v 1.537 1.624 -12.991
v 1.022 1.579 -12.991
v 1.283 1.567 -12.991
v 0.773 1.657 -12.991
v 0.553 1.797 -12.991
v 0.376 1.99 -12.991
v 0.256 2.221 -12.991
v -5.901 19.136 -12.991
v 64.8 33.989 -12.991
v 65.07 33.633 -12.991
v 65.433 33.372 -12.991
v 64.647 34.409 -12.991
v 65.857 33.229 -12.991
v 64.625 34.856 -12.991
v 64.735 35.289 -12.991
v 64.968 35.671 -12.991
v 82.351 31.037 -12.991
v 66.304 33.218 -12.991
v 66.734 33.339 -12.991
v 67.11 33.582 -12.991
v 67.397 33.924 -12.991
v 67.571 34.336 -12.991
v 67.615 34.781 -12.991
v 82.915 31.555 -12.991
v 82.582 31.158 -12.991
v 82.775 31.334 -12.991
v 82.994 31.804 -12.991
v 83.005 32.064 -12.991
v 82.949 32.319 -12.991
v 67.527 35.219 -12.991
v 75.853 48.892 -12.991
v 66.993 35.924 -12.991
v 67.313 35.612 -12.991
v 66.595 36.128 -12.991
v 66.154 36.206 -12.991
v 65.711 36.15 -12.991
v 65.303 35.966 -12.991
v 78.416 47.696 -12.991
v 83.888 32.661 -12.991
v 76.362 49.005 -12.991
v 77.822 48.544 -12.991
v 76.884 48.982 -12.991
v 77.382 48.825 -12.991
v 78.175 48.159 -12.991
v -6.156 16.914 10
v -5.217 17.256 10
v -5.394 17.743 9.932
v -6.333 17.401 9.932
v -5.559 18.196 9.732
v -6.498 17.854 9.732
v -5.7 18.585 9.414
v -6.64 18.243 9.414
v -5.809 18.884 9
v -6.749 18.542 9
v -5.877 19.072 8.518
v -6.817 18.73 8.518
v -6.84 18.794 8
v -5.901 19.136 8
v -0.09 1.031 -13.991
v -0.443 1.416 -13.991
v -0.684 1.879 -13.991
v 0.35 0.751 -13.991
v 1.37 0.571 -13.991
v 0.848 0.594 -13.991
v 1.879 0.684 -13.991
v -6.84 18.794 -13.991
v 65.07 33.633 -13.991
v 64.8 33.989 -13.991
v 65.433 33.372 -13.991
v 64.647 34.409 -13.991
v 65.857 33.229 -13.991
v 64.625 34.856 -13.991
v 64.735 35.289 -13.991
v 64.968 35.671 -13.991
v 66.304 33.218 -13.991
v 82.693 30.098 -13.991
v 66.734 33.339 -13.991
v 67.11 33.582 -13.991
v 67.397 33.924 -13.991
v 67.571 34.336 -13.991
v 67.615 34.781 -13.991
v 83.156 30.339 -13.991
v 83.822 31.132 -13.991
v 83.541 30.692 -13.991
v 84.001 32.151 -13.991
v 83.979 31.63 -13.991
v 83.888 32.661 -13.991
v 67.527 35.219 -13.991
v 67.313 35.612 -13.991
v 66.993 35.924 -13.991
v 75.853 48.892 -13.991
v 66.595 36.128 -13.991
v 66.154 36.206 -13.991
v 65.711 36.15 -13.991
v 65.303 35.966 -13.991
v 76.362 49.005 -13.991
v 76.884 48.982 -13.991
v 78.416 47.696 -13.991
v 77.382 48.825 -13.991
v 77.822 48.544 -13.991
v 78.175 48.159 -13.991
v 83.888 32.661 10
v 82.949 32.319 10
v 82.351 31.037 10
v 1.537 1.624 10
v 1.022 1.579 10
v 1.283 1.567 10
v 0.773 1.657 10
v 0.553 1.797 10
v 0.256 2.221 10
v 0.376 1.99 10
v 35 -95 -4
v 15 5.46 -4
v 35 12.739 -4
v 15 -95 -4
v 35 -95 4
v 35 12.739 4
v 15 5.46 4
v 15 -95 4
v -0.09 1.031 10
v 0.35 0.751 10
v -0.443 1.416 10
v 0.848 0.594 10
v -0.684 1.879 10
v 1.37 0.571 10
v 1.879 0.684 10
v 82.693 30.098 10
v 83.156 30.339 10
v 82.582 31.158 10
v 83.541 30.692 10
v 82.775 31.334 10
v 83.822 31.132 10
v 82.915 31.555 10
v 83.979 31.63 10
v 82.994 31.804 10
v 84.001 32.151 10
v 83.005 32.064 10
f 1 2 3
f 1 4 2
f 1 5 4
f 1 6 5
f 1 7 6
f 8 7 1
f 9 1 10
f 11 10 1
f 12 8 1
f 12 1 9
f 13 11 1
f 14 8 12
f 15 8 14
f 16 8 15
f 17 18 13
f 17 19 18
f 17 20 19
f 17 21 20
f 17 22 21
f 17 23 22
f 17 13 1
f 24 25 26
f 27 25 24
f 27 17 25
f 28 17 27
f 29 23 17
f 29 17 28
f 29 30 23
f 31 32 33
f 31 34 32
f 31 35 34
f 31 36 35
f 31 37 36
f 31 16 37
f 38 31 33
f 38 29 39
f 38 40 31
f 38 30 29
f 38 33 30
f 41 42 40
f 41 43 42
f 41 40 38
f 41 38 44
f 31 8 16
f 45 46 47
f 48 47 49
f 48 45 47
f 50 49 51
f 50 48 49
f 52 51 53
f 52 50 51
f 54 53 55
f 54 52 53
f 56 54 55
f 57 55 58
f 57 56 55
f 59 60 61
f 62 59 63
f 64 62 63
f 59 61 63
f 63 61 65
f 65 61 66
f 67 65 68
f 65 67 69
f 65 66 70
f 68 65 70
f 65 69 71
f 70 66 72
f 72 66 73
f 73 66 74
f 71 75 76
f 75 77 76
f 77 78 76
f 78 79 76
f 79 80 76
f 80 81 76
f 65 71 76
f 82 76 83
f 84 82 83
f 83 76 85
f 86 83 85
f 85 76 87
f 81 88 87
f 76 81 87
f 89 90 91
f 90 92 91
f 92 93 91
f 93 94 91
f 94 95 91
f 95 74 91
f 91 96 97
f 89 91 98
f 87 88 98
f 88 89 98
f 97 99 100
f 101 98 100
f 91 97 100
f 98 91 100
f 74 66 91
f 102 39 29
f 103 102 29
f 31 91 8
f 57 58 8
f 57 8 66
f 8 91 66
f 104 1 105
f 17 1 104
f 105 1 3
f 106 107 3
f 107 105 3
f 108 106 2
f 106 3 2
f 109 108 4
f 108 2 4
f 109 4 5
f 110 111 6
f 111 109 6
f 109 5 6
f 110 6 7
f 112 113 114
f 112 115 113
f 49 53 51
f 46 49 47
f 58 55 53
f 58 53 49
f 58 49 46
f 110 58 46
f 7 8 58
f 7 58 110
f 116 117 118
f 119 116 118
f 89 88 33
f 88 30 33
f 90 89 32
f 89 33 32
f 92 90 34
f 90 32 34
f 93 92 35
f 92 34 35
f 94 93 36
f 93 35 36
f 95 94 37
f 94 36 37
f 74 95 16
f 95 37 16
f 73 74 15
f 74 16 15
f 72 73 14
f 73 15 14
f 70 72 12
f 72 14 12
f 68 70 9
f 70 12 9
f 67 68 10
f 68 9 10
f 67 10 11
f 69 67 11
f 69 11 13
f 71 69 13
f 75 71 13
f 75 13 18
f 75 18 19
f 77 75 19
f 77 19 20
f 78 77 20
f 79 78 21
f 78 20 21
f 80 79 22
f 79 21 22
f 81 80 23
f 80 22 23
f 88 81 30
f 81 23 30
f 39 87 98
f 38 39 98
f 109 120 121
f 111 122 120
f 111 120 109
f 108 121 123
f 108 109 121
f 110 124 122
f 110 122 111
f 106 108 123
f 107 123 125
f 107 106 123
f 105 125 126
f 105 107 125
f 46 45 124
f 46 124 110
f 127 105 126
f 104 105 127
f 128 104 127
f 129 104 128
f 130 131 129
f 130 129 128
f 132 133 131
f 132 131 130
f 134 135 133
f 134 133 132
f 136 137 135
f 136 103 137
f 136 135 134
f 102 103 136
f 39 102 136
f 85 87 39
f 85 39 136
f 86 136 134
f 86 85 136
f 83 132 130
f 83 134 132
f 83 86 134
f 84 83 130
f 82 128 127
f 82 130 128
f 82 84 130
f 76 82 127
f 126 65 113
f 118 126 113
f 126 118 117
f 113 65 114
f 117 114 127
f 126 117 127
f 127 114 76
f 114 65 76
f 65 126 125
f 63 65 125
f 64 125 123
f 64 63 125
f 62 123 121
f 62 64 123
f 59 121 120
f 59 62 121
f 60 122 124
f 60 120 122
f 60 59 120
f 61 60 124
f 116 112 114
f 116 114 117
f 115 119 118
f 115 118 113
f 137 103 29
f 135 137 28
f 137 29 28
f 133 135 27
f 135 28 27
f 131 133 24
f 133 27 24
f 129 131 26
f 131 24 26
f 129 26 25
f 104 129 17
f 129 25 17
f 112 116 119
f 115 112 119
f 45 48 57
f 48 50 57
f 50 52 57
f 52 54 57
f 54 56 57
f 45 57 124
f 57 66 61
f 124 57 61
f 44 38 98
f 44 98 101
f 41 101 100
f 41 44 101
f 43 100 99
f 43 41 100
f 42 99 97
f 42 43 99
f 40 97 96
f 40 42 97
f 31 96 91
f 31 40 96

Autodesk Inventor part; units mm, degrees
ref_plane "YZ Plane" through (0, 0, 0) normal (1, 0, 0) x (0, 1, 0)
ref_plane "XY Plane" through (0, 0, 0) normal (0, 0, 1) x (1, 0, 0)
sketch "Sketch1" plane through (0, 0, 0) normal (0, 0, 1) x (1, 0, 0)
  line L0 (1.879385, 0.68404) -> (82.692951, 30.097773)
  line L1 (0, 0) -> (86, 0) construction
  line L2 (83.888296, 32.661198) -> (77.731933, 49.575665)
  line L3 (77.731933, 49.575665) -> (-6.840403, 18.793852)
  line L4 (-6.840403, 18.793852) -> (-0.68404, 1.879385)
  arc A0 (-0.68404, 1.879385) -> (1.879385, 0.68404) centre (1.195345, 2.563426) ccw
  arc A1 (82.692951, 30.097773) -> (83.888296, 32.661198) centre (82.00891, 31.977158) ccw
  point P0 (84.572336, 30.781813)
  dimension "d0" = 90
  dimension "d1" = 20
  dimension "d2" = 20
  dimension "d9" = 2
extrude "Extrusion1" add sketch "Sketch1" along normal blind 10 and the other way blind 13.991
shell "Shell1" thickness 1 removed faces 3 at (49.541154, 39.315061, -5.994) at (81.836175, 38.299354, 2.003) at (24.256972, 23.017853, 10)
fillet "Fillet1" radius 2 2 edges at (-6.3706, 18.9649, 10) (77.7319, 49.5757, -13.491)
sketch "Sketch2" plane through (1.537365, 1.623733, -12.991) normal (0, 0, 1) x (0.9396926, 0.3420201, 0)
  point P0 (-2, -1)
sketch "Sketch3" plane through (1.537365, 1.623733, -12.991) normal (0, 0, 1) x (0.9396926, 0.3420201, 0)
  circle A0 centre (72, 9) radius 1.5
  line L0 (88, 17) -> (88, 1) projected
  line L1 (86, 0) -> (0, 0) projected
  point P0 (-2, -1)
  dimension "d10" = 3
  dimension "d11" = 16
  dimension "d12" = 9
extrude "Extrusion2" cut sketch "Sketch3" against normal through all
ref_plane "Work Plane1" through (0, -95, 0) normal (0, 1, 0) x (-1, 0, 0)
sketch "Sketch4" plane through (0, -95, 0) normal (0, 1, 0) x (-1, 0, 0)
  line L0 (-15, -4) -> (-35, -4)
  line L1 (-35, -4) -> (-35, 4)
  line L2 (-35, 4) -> (-15, 4)
  line L3 (-15, 4) -> (-15, -4)
  point P0 (0, 0)
  point P1 (-25, 4)
  point P2 (-25, -4)
  dimension "d16" = 20
  dimension "d17" = 8
  dimension "d18" = 25
  dimension "d19" = 4
extrude "Extrusion3" add sketch "Sketch4" along normal up to surface surface through (1.879385, 0.68404, 0) normal (0.3420201, -0.9396926, 0)
properties part number "shooter base_3DPrint"
